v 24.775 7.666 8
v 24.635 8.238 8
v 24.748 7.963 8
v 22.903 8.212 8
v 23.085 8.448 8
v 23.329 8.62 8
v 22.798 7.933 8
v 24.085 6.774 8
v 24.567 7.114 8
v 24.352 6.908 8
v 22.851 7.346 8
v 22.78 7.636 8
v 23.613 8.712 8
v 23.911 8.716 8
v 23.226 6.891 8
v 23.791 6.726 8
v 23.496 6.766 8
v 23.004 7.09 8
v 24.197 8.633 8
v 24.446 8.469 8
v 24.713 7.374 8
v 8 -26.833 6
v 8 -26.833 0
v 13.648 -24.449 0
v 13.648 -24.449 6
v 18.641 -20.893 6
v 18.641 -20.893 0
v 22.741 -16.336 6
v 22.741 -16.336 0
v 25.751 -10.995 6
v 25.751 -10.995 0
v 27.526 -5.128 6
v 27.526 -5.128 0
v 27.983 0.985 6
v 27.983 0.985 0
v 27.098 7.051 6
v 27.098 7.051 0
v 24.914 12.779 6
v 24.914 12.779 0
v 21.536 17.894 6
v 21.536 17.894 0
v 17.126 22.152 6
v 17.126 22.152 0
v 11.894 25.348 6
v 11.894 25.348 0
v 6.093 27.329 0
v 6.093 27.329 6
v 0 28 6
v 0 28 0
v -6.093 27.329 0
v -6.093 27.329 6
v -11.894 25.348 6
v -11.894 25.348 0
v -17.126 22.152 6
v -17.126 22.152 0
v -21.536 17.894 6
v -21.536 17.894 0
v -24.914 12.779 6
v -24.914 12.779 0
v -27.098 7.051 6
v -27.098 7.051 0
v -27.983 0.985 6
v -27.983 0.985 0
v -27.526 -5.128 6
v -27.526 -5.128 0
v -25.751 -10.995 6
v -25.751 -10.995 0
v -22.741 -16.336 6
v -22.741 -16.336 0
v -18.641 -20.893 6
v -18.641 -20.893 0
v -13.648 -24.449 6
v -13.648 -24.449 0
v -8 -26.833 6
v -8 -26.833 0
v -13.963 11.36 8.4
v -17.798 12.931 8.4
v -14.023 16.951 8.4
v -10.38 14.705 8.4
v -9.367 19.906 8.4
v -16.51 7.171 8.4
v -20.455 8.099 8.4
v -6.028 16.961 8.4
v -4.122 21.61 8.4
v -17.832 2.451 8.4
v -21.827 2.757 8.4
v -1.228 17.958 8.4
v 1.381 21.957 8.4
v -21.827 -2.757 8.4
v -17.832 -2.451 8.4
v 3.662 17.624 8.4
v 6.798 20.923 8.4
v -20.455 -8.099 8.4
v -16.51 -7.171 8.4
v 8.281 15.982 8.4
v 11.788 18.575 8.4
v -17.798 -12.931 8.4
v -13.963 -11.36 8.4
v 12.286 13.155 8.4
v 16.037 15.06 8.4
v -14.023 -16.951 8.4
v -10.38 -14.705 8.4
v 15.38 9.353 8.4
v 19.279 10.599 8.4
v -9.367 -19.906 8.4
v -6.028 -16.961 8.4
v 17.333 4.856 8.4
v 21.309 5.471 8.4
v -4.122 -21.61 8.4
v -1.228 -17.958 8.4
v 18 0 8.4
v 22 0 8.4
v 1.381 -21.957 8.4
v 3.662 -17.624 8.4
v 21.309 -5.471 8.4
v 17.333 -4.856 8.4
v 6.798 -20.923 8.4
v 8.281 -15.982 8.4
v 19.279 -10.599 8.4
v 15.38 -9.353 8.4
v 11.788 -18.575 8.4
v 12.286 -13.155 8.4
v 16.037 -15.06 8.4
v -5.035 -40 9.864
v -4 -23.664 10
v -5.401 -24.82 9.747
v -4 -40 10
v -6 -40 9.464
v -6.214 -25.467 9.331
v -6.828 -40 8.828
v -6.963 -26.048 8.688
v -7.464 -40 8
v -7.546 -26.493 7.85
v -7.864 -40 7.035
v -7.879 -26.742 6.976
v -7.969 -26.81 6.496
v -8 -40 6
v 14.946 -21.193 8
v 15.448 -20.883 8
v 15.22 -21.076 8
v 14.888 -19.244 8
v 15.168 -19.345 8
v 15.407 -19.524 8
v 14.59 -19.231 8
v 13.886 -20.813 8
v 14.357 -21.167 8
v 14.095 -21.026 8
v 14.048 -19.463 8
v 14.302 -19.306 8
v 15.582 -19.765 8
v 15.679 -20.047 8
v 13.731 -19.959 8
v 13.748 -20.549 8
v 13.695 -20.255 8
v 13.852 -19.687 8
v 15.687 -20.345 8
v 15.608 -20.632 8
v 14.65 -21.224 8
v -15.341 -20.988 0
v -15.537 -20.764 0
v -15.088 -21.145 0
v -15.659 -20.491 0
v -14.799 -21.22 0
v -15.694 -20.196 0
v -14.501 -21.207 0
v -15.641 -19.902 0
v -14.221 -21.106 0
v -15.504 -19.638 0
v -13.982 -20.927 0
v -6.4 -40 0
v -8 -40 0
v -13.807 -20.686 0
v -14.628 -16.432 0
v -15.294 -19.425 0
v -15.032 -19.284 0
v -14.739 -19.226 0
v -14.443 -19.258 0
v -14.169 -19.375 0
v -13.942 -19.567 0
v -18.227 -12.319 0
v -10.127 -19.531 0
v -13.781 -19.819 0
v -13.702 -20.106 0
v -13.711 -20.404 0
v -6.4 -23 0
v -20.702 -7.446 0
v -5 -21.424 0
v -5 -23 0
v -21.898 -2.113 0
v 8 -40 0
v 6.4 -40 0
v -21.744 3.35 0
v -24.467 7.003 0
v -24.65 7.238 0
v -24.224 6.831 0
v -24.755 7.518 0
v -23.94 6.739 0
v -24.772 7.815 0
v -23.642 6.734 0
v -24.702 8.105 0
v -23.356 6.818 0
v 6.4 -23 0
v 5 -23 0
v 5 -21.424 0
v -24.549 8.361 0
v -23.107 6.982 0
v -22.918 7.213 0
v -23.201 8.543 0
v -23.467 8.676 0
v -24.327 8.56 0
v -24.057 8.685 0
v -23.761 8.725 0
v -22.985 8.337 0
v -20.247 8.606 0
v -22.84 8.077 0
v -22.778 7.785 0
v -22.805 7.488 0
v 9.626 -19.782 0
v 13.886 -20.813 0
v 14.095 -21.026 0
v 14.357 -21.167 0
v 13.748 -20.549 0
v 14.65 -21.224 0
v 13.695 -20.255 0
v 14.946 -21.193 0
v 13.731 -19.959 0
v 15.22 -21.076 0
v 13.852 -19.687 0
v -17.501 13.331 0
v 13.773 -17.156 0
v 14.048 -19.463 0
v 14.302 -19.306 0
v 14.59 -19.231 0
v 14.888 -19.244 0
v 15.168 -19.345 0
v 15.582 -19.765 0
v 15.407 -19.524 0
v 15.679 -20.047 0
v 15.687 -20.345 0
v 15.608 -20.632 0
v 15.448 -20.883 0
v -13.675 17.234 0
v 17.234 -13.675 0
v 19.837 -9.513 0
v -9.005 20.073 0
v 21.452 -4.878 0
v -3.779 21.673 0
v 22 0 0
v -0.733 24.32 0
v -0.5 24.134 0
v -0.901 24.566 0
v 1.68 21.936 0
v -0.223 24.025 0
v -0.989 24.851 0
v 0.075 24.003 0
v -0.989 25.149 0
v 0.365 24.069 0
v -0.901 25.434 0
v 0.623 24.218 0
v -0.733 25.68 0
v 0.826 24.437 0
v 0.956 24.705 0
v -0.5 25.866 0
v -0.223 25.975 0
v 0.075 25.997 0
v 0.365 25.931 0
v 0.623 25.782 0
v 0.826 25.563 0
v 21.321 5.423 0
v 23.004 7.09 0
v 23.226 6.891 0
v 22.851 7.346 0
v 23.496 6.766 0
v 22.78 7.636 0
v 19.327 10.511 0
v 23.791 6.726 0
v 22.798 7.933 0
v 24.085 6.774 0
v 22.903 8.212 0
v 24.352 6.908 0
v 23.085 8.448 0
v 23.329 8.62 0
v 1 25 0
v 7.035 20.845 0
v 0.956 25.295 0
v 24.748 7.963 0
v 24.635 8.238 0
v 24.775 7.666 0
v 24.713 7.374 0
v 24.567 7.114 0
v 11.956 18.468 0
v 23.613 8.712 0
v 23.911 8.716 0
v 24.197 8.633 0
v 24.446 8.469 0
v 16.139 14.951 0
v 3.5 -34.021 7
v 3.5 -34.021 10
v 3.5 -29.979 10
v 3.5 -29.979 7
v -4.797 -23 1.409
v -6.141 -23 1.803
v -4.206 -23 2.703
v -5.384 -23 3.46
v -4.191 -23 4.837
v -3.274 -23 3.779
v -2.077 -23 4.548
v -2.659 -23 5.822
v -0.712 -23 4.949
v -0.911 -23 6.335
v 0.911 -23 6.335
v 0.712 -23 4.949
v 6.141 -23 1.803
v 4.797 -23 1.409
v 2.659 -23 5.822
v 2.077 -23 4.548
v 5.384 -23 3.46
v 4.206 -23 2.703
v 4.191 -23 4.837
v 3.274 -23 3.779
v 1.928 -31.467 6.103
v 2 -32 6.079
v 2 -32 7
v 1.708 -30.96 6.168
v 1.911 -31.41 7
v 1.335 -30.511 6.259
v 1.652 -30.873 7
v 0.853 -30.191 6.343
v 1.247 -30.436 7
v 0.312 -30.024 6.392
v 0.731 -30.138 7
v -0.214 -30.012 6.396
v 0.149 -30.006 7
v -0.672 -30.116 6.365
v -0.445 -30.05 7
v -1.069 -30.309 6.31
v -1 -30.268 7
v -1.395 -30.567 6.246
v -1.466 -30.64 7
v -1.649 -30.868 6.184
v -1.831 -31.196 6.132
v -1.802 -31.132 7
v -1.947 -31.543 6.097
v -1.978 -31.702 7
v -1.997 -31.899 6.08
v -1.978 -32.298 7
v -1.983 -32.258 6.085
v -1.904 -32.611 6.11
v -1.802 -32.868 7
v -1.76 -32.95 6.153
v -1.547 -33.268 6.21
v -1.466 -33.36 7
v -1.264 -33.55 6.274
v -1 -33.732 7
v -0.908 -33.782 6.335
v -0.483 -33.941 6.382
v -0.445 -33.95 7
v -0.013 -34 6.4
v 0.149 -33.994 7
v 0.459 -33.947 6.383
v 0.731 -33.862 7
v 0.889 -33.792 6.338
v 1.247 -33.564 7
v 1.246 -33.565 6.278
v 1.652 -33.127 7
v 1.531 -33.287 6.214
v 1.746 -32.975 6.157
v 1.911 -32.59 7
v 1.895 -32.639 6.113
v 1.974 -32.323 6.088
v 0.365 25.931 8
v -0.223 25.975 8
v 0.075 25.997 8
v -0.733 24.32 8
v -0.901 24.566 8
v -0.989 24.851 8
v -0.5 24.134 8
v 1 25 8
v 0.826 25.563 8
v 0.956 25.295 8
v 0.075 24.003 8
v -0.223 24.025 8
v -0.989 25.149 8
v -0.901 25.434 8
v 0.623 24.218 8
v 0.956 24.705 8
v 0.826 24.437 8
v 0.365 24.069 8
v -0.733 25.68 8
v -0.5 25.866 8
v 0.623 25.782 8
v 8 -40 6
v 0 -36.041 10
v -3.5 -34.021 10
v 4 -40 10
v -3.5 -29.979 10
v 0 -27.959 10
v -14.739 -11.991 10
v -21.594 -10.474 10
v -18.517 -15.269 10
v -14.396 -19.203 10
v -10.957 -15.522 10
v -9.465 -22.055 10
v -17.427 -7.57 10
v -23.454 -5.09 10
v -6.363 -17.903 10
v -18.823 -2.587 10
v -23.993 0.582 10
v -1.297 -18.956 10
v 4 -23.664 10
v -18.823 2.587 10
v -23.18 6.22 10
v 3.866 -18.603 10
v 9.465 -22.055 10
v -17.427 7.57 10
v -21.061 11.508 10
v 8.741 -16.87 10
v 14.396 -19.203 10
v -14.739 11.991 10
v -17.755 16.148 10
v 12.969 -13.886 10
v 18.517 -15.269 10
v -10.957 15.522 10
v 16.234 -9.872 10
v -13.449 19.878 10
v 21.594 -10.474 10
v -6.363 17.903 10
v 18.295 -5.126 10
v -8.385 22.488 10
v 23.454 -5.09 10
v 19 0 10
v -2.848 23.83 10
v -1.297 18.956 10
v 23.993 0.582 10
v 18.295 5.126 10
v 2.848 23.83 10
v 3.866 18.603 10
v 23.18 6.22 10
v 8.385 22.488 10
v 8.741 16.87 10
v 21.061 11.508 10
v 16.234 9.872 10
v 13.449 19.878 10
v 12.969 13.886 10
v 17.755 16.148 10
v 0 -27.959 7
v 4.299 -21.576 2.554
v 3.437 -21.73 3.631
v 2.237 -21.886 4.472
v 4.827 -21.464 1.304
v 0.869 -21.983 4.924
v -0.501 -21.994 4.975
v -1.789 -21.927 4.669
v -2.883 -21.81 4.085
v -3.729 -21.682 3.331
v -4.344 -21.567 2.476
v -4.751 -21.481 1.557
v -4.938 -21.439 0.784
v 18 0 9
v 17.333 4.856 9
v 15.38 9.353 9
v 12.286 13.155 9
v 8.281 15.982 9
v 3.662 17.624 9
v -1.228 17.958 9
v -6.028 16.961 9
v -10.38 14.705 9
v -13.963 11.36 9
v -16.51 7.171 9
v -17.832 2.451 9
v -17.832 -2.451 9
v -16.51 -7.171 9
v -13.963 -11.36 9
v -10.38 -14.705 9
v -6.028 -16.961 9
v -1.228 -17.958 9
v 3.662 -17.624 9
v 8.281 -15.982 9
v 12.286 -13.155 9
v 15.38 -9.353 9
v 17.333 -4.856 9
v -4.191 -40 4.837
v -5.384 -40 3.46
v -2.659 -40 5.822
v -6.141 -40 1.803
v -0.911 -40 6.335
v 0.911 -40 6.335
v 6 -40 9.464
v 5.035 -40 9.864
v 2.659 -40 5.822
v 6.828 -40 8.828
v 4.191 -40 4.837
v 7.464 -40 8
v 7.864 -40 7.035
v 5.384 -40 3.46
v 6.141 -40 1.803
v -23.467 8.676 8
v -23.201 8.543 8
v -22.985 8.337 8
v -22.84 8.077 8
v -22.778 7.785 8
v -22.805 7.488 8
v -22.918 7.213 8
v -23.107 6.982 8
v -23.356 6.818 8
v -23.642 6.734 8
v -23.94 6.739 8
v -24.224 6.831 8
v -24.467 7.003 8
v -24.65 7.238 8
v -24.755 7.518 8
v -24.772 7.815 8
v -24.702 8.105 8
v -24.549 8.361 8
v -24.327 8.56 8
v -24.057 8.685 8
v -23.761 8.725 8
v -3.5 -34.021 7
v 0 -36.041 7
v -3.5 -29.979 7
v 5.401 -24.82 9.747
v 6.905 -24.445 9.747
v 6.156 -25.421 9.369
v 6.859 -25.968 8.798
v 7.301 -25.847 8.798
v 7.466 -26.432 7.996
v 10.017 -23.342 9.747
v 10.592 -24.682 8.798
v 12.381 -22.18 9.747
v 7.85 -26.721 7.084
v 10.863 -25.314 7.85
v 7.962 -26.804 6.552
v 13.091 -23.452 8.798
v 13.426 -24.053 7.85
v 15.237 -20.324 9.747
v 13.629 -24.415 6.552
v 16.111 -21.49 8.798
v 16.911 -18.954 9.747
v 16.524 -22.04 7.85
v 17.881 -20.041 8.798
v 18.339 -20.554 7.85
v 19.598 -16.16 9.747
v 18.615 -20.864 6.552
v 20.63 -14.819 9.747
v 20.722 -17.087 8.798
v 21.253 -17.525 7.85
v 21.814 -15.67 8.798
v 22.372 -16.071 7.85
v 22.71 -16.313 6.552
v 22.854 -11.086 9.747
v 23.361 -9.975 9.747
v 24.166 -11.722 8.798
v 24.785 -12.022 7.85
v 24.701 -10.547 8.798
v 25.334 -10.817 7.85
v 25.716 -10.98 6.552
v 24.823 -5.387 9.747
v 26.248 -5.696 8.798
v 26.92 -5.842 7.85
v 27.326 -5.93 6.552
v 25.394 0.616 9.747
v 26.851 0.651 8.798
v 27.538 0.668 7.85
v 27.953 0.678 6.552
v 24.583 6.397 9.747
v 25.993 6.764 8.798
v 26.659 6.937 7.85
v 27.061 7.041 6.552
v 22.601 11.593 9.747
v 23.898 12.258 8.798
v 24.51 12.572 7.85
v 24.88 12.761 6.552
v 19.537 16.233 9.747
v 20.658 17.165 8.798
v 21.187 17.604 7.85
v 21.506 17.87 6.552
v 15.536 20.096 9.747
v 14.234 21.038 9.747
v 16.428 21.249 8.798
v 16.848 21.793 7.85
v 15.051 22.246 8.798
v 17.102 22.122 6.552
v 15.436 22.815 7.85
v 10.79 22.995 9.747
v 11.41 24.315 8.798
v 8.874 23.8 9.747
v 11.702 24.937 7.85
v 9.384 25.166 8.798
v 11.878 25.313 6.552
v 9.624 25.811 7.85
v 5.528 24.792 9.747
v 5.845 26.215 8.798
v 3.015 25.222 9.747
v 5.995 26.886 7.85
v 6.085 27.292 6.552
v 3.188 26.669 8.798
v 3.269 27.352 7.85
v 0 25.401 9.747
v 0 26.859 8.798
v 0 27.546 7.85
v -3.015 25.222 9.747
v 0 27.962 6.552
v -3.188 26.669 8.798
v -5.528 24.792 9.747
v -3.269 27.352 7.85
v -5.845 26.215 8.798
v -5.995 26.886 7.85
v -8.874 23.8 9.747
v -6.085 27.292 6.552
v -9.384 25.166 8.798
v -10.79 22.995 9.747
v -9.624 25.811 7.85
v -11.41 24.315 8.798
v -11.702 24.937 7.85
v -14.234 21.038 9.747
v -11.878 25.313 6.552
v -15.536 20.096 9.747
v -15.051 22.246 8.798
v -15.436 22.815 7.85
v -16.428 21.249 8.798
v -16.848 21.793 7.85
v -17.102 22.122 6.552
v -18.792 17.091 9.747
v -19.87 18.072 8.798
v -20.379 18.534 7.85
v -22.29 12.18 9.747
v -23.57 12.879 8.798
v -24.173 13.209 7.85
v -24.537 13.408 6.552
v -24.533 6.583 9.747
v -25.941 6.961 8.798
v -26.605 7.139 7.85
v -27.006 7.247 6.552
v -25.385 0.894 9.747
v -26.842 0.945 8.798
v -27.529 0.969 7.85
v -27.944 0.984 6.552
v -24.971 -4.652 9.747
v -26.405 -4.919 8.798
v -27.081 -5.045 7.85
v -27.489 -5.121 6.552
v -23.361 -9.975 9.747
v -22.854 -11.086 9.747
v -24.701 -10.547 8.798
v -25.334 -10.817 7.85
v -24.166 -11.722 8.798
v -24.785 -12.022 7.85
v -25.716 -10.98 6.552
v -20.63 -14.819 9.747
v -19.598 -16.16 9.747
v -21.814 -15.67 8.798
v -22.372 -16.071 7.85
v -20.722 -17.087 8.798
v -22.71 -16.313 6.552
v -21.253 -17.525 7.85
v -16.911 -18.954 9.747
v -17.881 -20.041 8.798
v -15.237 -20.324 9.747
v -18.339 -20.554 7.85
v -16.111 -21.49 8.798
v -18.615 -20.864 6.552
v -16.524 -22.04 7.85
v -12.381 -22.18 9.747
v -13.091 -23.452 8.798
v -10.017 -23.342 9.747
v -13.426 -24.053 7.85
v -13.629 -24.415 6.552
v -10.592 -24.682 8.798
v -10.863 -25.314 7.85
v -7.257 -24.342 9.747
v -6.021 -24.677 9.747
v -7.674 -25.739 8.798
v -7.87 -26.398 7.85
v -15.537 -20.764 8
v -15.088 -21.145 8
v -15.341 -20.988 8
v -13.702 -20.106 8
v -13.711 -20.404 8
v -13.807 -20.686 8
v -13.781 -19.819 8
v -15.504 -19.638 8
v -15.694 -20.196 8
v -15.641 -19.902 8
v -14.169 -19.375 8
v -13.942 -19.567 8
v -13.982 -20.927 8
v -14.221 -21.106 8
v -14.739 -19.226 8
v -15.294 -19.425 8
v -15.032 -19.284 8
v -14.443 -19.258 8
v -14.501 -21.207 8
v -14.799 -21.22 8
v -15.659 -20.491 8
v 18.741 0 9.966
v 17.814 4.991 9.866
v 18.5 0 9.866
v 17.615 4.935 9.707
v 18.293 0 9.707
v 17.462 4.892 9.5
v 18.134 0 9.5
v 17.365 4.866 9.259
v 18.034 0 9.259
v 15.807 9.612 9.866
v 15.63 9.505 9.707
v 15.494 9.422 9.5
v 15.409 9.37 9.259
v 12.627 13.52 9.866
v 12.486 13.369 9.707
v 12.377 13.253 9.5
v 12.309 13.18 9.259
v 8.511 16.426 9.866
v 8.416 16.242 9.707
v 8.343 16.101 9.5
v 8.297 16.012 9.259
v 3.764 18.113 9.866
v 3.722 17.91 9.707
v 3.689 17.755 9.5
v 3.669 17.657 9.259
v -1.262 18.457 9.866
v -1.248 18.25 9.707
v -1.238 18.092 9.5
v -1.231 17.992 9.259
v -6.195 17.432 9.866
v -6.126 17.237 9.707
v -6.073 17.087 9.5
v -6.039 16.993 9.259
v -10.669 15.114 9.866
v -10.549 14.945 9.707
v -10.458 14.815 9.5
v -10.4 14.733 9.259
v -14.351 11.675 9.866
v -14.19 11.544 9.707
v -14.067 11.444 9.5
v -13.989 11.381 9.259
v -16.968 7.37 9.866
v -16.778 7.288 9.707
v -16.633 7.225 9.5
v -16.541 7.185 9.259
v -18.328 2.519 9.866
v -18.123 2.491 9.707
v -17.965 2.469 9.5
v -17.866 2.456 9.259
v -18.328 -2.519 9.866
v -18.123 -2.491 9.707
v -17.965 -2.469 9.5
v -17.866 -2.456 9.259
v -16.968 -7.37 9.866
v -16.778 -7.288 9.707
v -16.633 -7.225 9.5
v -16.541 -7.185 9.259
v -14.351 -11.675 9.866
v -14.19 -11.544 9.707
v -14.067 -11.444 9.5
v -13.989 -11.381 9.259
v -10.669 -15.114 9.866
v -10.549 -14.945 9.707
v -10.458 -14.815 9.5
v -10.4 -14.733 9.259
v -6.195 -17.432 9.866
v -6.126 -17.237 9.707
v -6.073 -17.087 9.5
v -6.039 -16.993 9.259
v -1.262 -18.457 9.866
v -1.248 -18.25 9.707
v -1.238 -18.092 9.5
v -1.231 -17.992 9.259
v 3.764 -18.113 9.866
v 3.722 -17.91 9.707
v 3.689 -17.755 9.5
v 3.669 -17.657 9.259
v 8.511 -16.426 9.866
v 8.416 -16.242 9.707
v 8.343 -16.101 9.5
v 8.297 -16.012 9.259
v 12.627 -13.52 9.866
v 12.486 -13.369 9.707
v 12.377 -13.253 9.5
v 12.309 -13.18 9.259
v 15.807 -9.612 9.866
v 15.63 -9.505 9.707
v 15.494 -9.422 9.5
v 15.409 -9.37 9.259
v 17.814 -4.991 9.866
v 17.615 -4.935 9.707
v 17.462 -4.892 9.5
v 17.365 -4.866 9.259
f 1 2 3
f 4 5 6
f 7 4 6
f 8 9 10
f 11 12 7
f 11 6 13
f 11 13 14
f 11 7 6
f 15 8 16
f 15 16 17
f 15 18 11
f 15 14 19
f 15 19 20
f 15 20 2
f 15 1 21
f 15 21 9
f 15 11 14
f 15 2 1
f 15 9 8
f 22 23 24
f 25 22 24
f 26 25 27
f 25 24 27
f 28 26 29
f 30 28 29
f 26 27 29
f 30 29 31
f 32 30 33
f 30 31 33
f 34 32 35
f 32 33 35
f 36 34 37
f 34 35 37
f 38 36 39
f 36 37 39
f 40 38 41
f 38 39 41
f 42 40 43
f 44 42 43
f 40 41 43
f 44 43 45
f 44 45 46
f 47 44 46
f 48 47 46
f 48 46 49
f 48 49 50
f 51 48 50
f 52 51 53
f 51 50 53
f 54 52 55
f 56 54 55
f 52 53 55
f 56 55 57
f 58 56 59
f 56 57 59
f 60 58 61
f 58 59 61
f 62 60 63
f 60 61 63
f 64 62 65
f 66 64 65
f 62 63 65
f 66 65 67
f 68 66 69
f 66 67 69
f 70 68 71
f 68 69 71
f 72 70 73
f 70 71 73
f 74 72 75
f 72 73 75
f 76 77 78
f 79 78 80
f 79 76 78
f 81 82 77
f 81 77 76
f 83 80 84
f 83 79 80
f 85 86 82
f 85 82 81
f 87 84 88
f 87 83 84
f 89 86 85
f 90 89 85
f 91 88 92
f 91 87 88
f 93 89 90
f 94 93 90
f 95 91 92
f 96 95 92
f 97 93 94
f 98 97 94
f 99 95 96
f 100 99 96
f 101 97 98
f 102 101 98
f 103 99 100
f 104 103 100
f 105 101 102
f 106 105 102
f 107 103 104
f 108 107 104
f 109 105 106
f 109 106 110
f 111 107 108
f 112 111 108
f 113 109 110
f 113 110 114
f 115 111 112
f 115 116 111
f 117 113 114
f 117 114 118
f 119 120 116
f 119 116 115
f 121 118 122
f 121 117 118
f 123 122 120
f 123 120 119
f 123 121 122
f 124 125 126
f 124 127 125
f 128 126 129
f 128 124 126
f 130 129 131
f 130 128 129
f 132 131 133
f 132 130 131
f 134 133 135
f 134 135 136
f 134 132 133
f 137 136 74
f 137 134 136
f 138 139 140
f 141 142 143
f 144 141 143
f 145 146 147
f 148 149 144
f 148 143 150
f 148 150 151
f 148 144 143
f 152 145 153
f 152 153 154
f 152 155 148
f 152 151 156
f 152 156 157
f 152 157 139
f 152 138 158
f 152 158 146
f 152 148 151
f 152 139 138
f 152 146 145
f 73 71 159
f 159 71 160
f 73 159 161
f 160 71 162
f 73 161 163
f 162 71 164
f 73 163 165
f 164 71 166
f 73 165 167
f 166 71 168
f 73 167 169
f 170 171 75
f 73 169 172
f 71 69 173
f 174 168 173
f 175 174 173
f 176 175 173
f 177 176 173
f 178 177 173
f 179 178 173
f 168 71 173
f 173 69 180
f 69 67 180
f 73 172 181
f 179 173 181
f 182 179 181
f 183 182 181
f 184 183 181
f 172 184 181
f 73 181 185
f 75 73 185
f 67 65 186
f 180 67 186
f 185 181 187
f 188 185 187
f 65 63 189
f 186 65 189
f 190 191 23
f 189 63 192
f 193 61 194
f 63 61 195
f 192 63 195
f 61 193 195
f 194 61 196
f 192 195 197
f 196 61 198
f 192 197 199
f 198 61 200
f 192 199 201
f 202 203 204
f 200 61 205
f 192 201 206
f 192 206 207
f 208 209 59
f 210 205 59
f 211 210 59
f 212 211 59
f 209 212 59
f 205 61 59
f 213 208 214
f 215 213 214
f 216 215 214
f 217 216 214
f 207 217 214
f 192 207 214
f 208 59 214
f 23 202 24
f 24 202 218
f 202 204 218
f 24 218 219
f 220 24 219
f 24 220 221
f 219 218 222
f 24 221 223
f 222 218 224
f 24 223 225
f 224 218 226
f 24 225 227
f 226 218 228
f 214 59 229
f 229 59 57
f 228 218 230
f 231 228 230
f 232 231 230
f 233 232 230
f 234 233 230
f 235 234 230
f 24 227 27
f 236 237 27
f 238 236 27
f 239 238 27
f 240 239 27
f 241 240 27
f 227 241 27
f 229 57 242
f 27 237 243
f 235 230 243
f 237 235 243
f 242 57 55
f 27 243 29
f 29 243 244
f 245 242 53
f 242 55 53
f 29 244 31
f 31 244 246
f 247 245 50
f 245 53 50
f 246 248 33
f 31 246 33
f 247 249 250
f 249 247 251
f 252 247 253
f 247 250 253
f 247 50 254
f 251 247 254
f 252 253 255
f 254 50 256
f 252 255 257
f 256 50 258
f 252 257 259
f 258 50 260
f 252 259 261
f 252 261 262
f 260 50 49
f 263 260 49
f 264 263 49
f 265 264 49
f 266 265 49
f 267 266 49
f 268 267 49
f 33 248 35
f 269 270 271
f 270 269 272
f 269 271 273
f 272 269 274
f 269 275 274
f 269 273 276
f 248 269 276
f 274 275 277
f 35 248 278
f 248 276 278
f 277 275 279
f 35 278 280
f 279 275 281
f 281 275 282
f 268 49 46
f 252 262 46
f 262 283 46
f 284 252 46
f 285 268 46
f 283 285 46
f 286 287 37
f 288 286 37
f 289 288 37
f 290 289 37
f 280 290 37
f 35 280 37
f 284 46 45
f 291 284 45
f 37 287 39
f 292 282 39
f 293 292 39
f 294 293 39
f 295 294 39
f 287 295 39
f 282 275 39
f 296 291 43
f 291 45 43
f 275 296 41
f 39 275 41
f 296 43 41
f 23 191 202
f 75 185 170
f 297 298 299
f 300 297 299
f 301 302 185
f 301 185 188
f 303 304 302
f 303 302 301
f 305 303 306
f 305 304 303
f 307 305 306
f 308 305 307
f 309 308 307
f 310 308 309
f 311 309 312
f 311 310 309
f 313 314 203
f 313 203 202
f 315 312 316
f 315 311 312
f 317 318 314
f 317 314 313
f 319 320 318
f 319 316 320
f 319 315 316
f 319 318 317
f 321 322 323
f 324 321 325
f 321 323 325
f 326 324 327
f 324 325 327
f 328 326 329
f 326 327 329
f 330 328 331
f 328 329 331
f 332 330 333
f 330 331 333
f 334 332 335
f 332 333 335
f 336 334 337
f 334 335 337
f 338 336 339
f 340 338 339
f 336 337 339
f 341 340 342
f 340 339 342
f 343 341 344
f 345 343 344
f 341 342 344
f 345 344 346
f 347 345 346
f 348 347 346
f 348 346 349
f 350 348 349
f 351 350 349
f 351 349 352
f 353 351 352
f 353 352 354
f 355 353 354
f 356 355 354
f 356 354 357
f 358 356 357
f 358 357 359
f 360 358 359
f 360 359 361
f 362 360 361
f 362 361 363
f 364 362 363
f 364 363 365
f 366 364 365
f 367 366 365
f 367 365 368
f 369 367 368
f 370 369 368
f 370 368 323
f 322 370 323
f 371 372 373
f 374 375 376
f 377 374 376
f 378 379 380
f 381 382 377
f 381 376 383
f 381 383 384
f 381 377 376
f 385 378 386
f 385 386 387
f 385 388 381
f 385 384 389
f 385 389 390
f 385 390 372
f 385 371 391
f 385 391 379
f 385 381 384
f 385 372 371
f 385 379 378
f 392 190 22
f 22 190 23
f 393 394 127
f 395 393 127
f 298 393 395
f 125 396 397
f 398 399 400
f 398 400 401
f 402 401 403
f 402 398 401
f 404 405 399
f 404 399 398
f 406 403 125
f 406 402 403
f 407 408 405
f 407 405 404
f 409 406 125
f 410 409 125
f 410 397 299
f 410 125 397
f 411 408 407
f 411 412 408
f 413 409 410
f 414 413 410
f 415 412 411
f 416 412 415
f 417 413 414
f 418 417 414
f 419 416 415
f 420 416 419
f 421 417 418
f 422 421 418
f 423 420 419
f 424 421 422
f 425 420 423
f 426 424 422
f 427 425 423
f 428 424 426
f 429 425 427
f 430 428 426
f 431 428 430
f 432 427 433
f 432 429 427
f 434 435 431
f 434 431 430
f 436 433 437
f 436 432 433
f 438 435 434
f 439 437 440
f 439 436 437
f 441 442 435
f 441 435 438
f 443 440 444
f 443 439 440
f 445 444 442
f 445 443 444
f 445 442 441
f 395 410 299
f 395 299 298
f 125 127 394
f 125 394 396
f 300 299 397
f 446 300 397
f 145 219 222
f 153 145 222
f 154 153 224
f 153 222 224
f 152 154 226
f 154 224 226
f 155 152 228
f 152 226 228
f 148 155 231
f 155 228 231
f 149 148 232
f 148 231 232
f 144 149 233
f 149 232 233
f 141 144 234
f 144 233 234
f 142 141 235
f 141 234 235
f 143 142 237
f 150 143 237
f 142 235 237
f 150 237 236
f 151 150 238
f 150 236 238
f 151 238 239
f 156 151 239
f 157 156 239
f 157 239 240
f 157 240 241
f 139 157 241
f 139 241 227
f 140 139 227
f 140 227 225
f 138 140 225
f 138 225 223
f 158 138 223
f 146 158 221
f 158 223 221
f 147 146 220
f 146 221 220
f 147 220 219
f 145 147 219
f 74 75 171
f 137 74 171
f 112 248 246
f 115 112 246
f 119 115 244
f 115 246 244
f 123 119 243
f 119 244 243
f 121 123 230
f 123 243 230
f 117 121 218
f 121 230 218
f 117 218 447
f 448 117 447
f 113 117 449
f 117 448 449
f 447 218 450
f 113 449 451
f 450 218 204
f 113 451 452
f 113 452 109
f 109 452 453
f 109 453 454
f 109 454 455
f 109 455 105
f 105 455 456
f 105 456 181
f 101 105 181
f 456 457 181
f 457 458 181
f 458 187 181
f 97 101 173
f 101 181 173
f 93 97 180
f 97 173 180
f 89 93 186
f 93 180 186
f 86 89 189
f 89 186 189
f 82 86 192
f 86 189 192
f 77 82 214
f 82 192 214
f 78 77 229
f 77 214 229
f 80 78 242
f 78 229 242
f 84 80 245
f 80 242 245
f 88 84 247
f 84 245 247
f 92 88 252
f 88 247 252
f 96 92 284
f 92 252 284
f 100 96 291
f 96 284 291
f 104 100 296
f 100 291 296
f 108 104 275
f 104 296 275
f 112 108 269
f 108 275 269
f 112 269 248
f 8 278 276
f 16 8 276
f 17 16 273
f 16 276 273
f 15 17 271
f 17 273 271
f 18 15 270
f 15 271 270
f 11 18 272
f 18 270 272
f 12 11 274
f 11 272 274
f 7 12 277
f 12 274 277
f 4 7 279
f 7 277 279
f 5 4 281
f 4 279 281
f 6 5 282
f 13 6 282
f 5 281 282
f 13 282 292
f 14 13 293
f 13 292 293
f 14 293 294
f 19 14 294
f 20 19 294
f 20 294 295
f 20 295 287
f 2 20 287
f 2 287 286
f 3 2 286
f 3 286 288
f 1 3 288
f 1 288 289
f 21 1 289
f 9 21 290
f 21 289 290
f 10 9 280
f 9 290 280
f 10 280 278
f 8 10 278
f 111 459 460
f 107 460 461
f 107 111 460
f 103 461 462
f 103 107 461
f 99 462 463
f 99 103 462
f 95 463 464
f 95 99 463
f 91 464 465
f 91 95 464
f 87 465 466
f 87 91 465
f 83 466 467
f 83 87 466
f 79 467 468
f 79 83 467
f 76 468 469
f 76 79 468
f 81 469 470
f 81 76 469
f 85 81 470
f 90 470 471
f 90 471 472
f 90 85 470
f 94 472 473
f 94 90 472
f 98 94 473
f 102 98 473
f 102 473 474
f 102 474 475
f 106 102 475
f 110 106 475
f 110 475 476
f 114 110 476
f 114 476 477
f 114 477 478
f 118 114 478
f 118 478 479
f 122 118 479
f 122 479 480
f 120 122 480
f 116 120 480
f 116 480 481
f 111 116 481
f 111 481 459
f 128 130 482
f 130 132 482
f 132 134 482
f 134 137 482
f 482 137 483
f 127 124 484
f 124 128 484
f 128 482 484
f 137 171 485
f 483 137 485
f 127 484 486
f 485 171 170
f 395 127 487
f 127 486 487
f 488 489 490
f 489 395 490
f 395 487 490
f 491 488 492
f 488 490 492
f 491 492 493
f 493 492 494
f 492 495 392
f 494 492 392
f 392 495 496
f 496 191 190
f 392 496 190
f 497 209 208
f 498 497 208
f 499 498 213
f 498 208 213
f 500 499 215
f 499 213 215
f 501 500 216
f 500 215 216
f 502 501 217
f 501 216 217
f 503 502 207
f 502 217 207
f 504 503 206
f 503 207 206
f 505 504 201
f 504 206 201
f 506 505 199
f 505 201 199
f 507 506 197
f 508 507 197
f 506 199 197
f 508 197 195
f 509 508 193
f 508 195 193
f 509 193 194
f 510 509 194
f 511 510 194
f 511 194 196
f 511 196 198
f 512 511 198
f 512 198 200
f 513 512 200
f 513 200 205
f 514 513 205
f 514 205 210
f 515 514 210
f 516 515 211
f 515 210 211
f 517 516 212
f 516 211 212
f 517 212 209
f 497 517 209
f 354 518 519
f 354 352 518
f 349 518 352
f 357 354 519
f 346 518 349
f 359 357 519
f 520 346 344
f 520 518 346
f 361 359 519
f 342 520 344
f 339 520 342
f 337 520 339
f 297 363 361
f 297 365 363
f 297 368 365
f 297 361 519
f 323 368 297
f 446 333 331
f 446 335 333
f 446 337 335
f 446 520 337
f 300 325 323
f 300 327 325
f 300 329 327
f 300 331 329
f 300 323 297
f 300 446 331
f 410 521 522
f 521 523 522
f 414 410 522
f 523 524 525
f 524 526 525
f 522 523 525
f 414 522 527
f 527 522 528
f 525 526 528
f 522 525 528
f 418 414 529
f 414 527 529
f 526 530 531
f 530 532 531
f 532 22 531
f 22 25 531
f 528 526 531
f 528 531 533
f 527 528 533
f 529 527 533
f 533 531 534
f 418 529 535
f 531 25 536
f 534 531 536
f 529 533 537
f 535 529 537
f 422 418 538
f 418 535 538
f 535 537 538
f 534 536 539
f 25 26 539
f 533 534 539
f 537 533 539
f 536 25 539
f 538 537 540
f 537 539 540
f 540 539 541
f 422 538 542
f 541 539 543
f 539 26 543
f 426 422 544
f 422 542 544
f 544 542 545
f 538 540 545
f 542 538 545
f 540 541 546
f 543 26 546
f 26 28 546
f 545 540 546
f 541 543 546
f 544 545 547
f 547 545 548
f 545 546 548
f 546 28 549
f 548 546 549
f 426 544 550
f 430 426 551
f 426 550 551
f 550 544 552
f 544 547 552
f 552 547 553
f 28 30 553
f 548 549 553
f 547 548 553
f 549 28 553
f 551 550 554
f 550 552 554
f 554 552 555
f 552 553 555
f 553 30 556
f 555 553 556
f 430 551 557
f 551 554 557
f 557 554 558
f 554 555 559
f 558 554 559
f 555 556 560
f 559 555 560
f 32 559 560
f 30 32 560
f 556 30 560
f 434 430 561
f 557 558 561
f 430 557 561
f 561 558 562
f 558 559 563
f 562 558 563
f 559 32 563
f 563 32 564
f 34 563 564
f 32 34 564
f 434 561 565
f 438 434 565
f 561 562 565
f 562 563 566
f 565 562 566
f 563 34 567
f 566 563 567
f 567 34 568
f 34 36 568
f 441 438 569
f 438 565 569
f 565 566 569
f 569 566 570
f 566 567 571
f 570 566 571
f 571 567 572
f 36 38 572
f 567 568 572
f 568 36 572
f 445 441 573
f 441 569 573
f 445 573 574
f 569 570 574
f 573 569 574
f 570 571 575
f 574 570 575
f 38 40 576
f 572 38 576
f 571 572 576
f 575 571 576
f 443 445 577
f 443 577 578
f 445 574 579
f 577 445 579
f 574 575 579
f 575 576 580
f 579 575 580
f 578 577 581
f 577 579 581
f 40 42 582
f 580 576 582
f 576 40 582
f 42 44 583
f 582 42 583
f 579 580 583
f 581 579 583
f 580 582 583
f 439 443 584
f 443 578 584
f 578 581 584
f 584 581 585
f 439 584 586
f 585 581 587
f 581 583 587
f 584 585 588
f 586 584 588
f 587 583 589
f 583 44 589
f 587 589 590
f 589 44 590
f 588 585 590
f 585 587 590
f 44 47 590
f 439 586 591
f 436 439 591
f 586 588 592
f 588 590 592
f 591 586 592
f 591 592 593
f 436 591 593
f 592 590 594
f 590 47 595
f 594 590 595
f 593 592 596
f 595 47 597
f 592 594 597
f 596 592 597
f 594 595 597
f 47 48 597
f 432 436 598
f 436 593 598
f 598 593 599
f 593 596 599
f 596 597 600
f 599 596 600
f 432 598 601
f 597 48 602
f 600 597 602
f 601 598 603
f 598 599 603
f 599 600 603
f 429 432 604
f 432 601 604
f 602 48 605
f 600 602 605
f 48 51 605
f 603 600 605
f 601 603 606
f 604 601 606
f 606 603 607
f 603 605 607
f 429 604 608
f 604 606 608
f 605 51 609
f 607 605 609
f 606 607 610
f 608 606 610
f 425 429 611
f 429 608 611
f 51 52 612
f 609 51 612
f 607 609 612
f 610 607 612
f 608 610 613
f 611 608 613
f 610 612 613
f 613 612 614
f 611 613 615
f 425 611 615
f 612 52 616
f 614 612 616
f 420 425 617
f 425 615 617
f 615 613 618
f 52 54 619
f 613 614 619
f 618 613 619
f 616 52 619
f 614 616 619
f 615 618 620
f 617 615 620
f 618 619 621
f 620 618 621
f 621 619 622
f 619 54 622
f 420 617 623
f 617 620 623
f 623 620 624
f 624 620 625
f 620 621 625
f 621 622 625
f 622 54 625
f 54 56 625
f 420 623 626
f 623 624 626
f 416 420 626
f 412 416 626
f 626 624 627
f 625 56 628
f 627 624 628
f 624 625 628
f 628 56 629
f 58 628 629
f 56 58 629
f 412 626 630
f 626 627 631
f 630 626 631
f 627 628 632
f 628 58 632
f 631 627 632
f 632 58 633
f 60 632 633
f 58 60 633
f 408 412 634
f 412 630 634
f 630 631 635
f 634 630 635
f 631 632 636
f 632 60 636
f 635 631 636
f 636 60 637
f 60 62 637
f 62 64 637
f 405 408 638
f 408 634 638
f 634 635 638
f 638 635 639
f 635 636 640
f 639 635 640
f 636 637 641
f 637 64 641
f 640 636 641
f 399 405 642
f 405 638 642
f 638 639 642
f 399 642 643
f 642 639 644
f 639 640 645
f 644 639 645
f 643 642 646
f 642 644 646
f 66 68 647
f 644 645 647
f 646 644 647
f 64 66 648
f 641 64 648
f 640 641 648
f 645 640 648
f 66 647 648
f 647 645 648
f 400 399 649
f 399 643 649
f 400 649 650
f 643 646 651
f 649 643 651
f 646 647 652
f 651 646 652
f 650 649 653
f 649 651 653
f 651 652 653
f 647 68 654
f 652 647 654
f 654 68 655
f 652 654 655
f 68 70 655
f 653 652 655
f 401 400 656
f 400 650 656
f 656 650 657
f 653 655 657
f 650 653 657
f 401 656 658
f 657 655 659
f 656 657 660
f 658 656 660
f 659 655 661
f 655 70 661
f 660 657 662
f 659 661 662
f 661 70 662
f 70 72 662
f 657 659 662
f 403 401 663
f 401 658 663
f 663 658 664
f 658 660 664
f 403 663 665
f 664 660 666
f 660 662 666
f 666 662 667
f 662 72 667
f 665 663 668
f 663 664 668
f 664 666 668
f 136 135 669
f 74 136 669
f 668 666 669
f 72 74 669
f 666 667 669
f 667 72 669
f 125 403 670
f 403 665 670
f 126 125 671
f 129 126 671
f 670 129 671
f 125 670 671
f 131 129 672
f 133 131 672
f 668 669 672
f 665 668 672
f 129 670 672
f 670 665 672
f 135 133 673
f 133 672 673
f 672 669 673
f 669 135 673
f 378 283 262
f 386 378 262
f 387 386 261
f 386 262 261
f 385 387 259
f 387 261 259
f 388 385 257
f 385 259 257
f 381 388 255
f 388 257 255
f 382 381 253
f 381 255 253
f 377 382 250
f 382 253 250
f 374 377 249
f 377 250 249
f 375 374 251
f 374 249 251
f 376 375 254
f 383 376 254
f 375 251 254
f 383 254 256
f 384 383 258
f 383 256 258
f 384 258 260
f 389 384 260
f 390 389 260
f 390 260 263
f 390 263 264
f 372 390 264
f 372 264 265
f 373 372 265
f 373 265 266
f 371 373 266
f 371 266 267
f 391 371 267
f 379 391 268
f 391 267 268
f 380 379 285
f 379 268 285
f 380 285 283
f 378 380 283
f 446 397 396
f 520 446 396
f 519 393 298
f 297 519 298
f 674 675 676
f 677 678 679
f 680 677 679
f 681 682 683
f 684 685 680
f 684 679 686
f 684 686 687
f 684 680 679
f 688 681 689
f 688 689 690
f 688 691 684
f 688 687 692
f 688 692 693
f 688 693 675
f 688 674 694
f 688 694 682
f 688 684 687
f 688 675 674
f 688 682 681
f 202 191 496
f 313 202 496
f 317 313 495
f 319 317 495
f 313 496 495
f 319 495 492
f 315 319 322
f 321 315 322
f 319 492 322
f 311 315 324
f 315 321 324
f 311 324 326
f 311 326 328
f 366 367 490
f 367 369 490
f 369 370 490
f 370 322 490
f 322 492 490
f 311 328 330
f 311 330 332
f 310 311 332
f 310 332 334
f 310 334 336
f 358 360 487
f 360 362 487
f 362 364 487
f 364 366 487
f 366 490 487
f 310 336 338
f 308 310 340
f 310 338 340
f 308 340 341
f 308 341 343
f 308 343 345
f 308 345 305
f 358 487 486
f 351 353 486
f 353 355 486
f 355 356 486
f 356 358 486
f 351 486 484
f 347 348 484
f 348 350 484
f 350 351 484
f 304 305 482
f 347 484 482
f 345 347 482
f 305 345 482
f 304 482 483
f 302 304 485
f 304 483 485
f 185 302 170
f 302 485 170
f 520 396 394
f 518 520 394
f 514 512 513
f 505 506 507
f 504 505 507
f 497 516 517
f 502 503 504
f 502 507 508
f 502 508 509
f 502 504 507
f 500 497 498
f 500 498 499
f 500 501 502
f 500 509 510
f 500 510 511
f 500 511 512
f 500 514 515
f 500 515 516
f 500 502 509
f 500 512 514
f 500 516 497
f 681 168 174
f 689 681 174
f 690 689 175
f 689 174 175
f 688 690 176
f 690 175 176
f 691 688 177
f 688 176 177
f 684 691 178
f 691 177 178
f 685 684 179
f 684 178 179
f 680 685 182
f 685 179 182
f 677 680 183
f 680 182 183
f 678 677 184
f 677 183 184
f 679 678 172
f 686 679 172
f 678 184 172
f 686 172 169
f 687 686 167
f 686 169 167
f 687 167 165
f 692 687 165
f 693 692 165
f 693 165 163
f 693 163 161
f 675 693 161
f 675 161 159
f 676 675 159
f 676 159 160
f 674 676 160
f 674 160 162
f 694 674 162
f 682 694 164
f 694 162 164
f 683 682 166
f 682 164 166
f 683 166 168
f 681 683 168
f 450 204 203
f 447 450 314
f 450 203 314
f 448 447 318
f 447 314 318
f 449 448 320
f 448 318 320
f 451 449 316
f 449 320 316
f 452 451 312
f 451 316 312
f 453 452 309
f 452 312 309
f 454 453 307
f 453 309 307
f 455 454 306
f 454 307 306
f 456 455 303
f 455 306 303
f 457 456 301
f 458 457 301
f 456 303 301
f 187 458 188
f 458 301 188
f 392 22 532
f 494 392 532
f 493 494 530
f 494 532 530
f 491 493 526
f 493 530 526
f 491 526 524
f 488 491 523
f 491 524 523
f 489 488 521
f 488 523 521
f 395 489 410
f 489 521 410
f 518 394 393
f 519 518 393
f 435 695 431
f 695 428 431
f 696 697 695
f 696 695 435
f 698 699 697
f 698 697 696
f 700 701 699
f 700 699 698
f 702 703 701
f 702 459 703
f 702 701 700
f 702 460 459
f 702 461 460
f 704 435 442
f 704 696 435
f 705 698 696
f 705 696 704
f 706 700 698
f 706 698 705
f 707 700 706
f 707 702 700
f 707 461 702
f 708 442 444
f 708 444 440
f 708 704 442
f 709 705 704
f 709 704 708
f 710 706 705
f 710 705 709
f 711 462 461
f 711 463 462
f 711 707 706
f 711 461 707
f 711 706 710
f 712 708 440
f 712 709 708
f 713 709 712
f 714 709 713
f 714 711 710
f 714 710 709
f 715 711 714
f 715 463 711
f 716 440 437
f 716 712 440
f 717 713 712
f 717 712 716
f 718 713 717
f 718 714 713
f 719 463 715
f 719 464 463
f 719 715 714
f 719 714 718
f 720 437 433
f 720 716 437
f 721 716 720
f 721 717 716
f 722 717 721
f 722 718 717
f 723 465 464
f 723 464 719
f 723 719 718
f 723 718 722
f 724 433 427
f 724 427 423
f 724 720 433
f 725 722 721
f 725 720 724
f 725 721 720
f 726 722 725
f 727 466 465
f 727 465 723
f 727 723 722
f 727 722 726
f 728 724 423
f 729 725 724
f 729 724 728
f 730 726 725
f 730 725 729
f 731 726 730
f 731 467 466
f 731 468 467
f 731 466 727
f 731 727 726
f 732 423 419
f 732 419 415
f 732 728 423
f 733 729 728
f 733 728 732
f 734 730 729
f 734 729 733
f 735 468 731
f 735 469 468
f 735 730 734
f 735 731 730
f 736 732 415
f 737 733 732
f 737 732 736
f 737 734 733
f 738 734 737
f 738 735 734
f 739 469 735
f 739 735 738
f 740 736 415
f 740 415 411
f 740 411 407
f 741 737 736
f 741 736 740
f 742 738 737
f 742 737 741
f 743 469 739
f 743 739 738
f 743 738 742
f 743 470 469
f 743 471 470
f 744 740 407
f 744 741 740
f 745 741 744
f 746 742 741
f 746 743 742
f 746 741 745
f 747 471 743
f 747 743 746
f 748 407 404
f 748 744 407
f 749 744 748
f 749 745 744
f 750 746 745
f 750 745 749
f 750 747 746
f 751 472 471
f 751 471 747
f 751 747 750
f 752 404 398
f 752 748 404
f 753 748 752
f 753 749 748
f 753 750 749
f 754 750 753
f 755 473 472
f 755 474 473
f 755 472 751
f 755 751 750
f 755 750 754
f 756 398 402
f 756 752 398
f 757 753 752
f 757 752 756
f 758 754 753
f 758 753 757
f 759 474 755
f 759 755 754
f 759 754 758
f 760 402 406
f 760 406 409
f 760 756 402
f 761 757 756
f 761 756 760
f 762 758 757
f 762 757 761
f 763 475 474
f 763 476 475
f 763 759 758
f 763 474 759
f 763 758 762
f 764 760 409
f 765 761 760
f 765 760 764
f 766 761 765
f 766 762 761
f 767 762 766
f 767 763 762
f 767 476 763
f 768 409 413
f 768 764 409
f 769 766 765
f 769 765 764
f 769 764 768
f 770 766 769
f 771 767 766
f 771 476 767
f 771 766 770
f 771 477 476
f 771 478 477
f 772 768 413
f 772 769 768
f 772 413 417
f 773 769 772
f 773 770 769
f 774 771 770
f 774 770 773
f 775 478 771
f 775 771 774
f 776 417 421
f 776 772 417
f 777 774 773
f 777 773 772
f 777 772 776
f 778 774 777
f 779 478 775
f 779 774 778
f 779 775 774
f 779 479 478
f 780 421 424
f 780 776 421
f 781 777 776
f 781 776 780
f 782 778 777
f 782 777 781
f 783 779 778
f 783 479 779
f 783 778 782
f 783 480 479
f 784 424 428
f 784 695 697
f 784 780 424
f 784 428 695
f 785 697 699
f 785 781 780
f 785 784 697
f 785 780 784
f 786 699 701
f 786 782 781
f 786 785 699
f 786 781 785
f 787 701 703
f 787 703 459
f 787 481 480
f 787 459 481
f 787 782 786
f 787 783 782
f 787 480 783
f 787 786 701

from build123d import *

# Parameters (mm, degrees)
SKETCH_R           = 18
PAD_DEPTH          = 10
SKETCH001_R        = 22
POCKET_DEPTH       = 8.4
SKETCH002_R        = 6.4
POCKET001_DEPTH    = 17
SKETCH003_R        = 5
POCKET002_DEPTH    = 5
SKETCH004_R        = 1
POCKET003_DEPTH    = 8
POLARPATTERN_COUNT = 5
POCKET004_DEPTH    = 3
SKETCH006_R        = 2
POCKET005_DEPTH    = 5
FILLET_R           = 4
FILLET001_R        = 1


with BuildPart() as part:
    # Sketch → Pad (new body)
    with BuildSketch(Plane.XY):
        with BuildLine():
            Line((-8, -40), (8, -40))
            Line((8, -40), (8, -26.832816))
            ThreePointArc((8, -26.832816), (0, 28), (-8, -26.832816))
            Line((-8, -26.832816), (-8, -40))
        make_face()
        Circle(SKETCH_R, mode=Mode.SUBTRACT)
    extrude(amount=PAD_DEPTH)

    # Sketch001 (on Face6 of Pad) → Pocket (cut)
    with BuildSketch(Plane(origin=(0, 0, 0), x_dir=(1, 0, 0), z_dir=(0, 0, -1))):
        Circle(SKETCH001_R)
    extrude(amount=-POCKET_DEPTH, mode=Mode.SUBTRACT)

    # Sketch002 (on Face1 of Pocket) → Pocket001 (cut)
    with BuildSketch(Plane.XZ.offset(40)):
        Circle(SKETCH002_R)
    extrude(amount=-POCKET001_DEPTH, mode=Mode.SUBTRACT)

    # Sketch003 (on Face7 of Pocket001) → Pocket002 (cut)
    with BuildSketch(Plane.XZ.offset(23)):
        Circle(SKETCH003_R)
    extrude(amount=-POCKET002_DEPTH, mode=Mode.SUBTRACT)

    # Sketch004 (on Face2 of Pocket002) → Pocket003 (cut)
    with BuildSketch(Plane(origin=(0, 0, 0), x_dir=(1, 0, 0), z_dir=(0, 0, -1))):
        with Locations((0, -25)):
            Circle(SKETCH004_R)
    pocket003 = extrude(amount=-POCKET003_DEPTH, mode=Mode.SUBTRACT)

    # PolarPattern: Pocket003 ×5 about axis
    polarpattern_axis = Axis((0, 0, 0), (0, 0, -1))
    for i in range(1, POLARPATTERN_COUNT):
        add(pocket003.rotate(polarpattern_axis, i * 360 / POLARPATTERN_COUNT), mode=Mode.SUBTRACT)

    # Sketch005 → Pocket004 (cut)
    with BuildSketch(Plane.XY.offset(10)):
        Polygon((0, -36.041452), (3.5, -34.020726), (3.5, -29.979274), (0, -27.958548), (-3.5, -29.979274), (-3.5, -34.020726), align=None)
    extrude(amount=-POCKET004_DEPTH, mode=Mode.SUBTRACT)

    # Sketch006 (on Face29 of Pocket004) → Pocket005 (cut)
    with BuildSketch(Plane.XY.offset(7)):
        with Locations((0, -32)):
            Circle(SKETCH006_R)
    extrude(amount=-POCKET005_DEPTH, mode=Mode.SUBTRACT)

    # Fillet
    fillet_edges = [part.edges().sort_by_distance(p)[0] for p in [
        (0, 28, 10),
        (8, -33.416408, 10),
        (-8, -33.416408, 10),
    ]]
    fillet(fillet_edges, radius=FILLET_R)

    # Fillet001
    fillet001_edges = [part.edges().sort_by_distance(p)[0] for p in [
        (-18, 0, 10),
    ]]
    fillet(fillet001_edges, radius=FILLET001_R)


solid = part.part
